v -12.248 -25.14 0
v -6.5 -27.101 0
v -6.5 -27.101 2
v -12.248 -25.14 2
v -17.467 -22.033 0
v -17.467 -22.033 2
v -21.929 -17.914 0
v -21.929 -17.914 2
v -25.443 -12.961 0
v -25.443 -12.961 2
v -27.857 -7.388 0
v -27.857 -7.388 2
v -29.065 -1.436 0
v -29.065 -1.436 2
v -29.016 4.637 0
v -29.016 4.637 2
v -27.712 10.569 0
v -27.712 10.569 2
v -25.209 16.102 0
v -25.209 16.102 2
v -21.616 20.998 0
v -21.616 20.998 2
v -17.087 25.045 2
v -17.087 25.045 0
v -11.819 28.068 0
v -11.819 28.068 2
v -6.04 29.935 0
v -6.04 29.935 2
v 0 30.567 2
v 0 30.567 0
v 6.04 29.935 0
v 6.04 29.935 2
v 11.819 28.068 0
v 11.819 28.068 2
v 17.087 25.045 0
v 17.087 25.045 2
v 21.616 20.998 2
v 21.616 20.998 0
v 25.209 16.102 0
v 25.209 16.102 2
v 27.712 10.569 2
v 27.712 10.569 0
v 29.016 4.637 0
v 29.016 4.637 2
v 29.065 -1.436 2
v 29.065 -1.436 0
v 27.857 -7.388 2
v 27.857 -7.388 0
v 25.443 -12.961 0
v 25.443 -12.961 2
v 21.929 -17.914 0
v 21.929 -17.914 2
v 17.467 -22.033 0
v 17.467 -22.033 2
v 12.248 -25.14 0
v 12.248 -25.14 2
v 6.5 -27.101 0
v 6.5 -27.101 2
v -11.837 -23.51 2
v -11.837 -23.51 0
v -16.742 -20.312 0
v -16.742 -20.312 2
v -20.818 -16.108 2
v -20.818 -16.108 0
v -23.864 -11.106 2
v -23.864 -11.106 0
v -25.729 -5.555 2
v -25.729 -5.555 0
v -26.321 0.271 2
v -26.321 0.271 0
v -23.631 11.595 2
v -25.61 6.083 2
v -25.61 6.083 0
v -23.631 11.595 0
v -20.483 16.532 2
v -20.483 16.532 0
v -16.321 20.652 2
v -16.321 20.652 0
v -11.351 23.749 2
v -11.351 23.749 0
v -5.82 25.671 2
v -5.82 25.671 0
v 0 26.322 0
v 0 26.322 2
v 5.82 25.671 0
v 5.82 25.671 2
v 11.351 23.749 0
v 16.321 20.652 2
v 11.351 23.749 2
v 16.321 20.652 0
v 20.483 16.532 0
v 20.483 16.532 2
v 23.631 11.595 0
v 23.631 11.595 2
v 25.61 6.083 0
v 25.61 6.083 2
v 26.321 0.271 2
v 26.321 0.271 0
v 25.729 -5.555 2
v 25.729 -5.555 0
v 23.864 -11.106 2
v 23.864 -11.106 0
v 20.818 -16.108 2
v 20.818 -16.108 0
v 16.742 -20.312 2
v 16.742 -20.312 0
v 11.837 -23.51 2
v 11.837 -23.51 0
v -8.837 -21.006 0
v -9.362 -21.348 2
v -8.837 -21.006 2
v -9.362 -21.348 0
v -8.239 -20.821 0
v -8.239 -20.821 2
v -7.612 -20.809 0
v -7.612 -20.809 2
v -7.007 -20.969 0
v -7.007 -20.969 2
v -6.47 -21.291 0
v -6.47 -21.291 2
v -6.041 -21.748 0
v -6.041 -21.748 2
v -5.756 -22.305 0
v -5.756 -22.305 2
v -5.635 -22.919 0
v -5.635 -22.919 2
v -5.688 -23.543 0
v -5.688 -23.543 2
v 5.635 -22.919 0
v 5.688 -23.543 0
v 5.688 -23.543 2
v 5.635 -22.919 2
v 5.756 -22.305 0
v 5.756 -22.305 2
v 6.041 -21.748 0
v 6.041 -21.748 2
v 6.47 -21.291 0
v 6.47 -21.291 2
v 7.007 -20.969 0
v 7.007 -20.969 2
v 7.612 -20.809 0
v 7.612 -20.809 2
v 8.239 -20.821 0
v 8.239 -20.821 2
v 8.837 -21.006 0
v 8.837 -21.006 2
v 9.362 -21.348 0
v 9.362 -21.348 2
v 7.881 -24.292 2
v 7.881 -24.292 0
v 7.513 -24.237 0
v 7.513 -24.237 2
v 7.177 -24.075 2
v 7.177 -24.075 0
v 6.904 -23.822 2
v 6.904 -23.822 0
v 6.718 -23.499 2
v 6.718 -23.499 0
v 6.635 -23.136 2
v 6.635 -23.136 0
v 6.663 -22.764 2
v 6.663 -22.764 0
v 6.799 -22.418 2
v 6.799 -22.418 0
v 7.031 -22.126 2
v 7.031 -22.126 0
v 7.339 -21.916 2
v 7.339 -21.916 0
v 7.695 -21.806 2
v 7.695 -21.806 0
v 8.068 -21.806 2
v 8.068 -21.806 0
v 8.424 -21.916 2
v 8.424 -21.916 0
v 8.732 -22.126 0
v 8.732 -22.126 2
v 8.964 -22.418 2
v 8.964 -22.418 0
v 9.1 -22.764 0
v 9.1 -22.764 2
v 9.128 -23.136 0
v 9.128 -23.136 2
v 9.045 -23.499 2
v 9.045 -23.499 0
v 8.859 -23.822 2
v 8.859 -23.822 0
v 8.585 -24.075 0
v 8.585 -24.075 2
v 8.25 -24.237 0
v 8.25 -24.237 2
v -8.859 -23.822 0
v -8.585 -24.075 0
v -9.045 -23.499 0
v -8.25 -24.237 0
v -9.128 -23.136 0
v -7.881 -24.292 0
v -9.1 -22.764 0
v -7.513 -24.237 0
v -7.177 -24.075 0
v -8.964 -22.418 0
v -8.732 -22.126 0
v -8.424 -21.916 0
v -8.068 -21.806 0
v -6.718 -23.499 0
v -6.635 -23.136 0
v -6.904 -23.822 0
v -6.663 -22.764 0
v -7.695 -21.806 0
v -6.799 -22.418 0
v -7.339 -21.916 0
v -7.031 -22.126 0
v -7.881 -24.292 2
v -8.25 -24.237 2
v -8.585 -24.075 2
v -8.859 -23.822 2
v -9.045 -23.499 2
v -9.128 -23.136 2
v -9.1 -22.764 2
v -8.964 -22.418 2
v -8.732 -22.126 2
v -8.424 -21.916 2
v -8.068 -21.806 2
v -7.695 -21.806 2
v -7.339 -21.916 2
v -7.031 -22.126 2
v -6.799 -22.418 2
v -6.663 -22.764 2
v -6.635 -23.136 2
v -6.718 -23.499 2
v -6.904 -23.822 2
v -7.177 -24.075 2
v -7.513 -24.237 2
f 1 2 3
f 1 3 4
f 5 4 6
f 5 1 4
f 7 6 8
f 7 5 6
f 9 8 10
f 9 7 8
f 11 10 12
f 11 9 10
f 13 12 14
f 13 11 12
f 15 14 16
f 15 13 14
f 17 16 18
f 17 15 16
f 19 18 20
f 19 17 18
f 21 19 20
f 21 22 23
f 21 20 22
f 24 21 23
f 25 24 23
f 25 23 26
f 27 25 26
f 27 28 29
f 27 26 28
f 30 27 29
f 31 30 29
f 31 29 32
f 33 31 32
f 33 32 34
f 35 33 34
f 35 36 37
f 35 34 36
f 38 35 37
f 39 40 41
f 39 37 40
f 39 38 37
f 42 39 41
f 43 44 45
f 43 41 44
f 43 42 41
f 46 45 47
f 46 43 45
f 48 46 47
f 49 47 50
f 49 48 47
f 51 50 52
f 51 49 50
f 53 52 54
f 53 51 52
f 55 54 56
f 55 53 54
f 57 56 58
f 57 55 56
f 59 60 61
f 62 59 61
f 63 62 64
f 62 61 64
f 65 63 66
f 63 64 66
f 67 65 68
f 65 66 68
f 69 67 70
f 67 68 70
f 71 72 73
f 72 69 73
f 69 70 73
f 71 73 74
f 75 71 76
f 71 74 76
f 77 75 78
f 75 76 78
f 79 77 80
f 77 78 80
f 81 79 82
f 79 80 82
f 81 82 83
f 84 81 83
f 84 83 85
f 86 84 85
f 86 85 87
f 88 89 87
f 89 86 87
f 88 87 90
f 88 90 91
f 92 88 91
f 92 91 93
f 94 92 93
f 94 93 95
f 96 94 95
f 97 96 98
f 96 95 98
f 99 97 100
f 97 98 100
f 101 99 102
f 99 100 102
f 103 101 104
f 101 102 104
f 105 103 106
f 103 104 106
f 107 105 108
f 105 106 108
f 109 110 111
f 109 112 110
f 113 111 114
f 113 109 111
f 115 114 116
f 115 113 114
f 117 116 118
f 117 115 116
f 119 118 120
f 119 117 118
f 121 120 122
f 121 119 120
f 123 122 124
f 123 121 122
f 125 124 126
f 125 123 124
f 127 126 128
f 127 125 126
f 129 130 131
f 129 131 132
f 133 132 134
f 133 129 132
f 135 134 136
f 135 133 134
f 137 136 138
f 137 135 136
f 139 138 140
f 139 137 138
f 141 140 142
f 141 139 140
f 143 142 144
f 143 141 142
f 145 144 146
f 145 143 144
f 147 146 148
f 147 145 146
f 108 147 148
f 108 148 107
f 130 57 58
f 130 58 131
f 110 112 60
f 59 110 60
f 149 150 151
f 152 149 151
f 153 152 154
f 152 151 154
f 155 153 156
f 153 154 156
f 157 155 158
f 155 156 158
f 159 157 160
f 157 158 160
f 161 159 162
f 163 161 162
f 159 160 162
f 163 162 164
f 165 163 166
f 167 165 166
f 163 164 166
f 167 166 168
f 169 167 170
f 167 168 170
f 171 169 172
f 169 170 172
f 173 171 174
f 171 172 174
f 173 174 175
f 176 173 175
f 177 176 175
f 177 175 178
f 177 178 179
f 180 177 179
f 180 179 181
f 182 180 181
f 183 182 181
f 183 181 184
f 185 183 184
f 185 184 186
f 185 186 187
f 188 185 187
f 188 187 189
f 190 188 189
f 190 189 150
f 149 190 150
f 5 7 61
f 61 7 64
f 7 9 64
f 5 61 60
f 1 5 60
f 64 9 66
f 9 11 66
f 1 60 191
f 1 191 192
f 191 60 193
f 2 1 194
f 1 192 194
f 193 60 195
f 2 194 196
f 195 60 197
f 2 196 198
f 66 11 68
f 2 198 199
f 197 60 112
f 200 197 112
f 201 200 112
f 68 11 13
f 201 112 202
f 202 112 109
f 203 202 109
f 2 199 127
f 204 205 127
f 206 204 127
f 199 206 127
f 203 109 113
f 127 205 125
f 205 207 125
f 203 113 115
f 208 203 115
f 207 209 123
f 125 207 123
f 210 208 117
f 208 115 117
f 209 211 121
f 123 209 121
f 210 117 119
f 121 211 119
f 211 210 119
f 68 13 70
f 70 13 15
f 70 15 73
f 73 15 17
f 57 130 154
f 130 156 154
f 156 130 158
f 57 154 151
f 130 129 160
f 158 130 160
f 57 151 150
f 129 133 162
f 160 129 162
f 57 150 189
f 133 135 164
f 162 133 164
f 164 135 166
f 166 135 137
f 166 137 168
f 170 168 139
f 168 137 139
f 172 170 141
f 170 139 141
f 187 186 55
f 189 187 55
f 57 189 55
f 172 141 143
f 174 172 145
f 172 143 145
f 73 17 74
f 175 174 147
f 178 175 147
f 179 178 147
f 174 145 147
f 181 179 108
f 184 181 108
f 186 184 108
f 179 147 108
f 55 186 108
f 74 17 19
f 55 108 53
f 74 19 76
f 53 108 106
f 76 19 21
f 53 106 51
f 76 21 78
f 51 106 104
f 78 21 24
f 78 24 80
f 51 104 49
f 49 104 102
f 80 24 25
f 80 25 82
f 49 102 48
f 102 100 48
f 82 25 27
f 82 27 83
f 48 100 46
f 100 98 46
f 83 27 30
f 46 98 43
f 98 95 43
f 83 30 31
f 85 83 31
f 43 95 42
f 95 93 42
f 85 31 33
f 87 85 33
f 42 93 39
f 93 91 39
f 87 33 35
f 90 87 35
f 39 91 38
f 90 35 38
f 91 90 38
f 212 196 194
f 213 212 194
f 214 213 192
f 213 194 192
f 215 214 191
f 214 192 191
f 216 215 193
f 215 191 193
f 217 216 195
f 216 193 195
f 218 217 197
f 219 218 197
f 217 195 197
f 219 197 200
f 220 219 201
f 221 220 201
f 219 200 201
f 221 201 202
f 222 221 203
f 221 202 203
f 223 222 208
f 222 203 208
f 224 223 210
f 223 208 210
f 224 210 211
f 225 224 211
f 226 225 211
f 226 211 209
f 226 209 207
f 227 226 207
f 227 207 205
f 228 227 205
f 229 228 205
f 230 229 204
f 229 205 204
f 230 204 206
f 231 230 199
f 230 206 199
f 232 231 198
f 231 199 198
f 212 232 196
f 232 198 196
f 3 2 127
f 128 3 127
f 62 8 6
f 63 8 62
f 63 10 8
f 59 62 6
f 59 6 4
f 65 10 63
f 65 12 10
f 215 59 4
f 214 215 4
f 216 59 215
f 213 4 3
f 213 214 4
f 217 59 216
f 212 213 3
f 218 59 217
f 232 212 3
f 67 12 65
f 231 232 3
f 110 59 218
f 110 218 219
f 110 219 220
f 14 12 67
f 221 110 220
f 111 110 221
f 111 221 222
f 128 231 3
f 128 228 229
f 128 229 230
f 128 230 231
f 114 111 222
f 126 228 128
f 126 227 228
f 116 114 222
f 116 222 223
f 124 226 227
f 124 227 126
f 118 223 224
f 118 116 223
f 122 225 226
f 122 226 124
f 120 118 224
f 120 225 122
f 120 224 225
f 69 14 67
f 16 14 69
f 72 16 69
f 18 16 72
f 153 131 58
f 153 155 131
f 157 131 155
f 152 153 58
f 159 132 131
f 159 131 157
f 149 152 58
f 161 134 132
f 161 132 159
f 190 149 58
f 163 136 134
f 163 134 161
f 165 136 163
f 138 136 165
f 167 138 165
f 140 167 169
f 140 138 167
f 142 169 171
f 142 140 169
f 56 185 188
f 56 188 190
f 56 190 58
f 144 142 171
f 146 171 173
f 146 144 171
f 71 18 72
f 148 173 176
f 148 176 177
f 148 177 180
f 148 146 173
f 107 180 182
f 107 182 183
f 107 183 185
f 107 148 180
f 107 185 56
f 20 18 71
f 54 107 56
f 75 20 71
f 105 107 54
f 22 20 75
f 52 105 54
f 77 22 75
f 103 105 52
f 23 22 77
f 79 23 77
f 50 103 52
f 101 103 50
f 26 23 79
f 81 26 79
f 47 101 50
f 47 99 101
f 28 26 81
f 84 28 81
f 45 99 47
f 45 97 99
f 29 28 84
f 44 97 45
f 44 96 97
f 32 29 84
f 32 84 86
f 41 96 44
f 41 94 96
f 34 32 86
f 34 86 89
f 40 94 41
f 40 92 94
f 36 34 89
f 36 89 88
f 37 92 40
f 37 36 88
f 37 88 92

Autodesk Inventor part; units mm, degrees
ref_plane "WorkPlane1" through (0, 0, 0) normal (0, 0, 1) x (1, 0, 0)
ref_plane "Work Plane2" through (0, 0, -2) normal (0, 0, 1) x (1, 0, 0)
ref_plane "WorkPlane2" through (0, 0, 1) normal (0, 0, 1) x (1, 0, 0)
sketch "Sketch1" plane through (0, 0, 0) normal (0, 0, 1) x (1, 0, 0)
  point P0 (0, 0)
sketch "Sketch2" plane through (0, 0, 0) normal (0, 0, 1) x (1, 0, 0)
  line L0 (6.5, -27.1007) -> (5.6878, -23.5434)
  arc A0 (9.3615, -21.348) -> (5.6878, -23.5434) centre (7.8813, -23.0425) ccw
  line L1 (9.3615, -21.348) -> (11.8371, -23.5105)
  arc A1 (11.8371, -23.5105) -> (-11.8371, -23.5105) centre (0, 0) ccw
  line L2 (-9.3615, -21.348) -> (-11.8371, -23.5105)
  arc A2 (-5.6878, -23.5434) -> (-9.3615, -21.348) centre (-7.8813, -23.0425) ccw
  line L3 (-6.5, -27.1007) -> (-5.6878, -23.5434)
  arc A3 (6.5, -27.1007) -> (-6.5, -27.1007) centre (0, 1.3667) ccw
  line L4 (0, 1.3667) -> (-6.5, -27.1007) construction
  line L5 (0, 1.3667) -> (6.5, -27.1007) construction
  dimension "d2" = 29.2
  dimension "d4" = 0
  dimension "d6" = 26.3222
  dimension "d8" = 1.3667
  dimension "d10" = 6.5
  dimension "d12" = 6.5
  dimension "d14" = 2.25
  dimension "d16" = 2.25
  dimension "d18" = 25.65
  dimension "d20" = 25.65
  dimension "d22" = 36
  dimension "d24" = 36
extrude "Extrusion1" add sketch "Sketch2" along normal blind 2
sketch "Sketch3" plane through (0, 0, 2) normal (0, 0, 1) x (1, 0, 0)
  arc A0 (-5.6878, -23.5434) -> (-9.3615, -21.348) centre (-7.8813, -23.0425) ccw projected
hole "Hole1" at (-7.8813, -23.0425, 2) direction (0, 0, -1) diameter 2.5 end through all
sketch "Sketch4" plane through (0, 0, 2) normal (0, 0, 1) x (1, 0, 0)
  arc A0 (9.3615, -21.348) -> (5.6878, -23.5434) centre (7.8813, -23.0425) ccw projected
hole "Hole2" at (7.8813, -23.0425, 2) direction (0, 0, -1) diameter 2.5 end through all
equation "\"d29\" = Diam5"
equation "\"d36\" = Diam5"
equation "\"d2\" = 0.5 * Diam2"
equation "\"d6\" = 0.5 * msp_dd1"
equation "\"d8\" = -0.5 * msp_dd1 + 0.5 * Diam2 - 0.222222 * ParA"
equation "\"d10\" = 2.6 * Diam5"
equation "\"d12\" = 2.6 * Diam5"
equation "\"d14\" = 0.9 * Diam5"
equation "\"d16\" = 0.9 * Diam5"
equation "\"d18\" = 1.3 * Diam5 + 0.5 * Diam2 - ParA"
equation "\"d20\" = 1.3 * Diam5 + 0.5 * Diam2 - ParA"
equation "\"d25\" = ParS"
equation "\"Diam5\" = 2.5"
equation "\"ParA\" = 6.8"
equation "\"ParS\" = 2"
equation "\"Diam2\" = 58.4"
equation "\"msp_dd1\" = -b + Diam2 - 0.111111 * ParA"
equation "\"msp_pom\" = 0.5 * Diam2 - b"
equation "\"TEMPLATE\" = 1.2345"
properties part number "ANSI B 27.7M - 3BMI-55" material "Steel, Mild"
